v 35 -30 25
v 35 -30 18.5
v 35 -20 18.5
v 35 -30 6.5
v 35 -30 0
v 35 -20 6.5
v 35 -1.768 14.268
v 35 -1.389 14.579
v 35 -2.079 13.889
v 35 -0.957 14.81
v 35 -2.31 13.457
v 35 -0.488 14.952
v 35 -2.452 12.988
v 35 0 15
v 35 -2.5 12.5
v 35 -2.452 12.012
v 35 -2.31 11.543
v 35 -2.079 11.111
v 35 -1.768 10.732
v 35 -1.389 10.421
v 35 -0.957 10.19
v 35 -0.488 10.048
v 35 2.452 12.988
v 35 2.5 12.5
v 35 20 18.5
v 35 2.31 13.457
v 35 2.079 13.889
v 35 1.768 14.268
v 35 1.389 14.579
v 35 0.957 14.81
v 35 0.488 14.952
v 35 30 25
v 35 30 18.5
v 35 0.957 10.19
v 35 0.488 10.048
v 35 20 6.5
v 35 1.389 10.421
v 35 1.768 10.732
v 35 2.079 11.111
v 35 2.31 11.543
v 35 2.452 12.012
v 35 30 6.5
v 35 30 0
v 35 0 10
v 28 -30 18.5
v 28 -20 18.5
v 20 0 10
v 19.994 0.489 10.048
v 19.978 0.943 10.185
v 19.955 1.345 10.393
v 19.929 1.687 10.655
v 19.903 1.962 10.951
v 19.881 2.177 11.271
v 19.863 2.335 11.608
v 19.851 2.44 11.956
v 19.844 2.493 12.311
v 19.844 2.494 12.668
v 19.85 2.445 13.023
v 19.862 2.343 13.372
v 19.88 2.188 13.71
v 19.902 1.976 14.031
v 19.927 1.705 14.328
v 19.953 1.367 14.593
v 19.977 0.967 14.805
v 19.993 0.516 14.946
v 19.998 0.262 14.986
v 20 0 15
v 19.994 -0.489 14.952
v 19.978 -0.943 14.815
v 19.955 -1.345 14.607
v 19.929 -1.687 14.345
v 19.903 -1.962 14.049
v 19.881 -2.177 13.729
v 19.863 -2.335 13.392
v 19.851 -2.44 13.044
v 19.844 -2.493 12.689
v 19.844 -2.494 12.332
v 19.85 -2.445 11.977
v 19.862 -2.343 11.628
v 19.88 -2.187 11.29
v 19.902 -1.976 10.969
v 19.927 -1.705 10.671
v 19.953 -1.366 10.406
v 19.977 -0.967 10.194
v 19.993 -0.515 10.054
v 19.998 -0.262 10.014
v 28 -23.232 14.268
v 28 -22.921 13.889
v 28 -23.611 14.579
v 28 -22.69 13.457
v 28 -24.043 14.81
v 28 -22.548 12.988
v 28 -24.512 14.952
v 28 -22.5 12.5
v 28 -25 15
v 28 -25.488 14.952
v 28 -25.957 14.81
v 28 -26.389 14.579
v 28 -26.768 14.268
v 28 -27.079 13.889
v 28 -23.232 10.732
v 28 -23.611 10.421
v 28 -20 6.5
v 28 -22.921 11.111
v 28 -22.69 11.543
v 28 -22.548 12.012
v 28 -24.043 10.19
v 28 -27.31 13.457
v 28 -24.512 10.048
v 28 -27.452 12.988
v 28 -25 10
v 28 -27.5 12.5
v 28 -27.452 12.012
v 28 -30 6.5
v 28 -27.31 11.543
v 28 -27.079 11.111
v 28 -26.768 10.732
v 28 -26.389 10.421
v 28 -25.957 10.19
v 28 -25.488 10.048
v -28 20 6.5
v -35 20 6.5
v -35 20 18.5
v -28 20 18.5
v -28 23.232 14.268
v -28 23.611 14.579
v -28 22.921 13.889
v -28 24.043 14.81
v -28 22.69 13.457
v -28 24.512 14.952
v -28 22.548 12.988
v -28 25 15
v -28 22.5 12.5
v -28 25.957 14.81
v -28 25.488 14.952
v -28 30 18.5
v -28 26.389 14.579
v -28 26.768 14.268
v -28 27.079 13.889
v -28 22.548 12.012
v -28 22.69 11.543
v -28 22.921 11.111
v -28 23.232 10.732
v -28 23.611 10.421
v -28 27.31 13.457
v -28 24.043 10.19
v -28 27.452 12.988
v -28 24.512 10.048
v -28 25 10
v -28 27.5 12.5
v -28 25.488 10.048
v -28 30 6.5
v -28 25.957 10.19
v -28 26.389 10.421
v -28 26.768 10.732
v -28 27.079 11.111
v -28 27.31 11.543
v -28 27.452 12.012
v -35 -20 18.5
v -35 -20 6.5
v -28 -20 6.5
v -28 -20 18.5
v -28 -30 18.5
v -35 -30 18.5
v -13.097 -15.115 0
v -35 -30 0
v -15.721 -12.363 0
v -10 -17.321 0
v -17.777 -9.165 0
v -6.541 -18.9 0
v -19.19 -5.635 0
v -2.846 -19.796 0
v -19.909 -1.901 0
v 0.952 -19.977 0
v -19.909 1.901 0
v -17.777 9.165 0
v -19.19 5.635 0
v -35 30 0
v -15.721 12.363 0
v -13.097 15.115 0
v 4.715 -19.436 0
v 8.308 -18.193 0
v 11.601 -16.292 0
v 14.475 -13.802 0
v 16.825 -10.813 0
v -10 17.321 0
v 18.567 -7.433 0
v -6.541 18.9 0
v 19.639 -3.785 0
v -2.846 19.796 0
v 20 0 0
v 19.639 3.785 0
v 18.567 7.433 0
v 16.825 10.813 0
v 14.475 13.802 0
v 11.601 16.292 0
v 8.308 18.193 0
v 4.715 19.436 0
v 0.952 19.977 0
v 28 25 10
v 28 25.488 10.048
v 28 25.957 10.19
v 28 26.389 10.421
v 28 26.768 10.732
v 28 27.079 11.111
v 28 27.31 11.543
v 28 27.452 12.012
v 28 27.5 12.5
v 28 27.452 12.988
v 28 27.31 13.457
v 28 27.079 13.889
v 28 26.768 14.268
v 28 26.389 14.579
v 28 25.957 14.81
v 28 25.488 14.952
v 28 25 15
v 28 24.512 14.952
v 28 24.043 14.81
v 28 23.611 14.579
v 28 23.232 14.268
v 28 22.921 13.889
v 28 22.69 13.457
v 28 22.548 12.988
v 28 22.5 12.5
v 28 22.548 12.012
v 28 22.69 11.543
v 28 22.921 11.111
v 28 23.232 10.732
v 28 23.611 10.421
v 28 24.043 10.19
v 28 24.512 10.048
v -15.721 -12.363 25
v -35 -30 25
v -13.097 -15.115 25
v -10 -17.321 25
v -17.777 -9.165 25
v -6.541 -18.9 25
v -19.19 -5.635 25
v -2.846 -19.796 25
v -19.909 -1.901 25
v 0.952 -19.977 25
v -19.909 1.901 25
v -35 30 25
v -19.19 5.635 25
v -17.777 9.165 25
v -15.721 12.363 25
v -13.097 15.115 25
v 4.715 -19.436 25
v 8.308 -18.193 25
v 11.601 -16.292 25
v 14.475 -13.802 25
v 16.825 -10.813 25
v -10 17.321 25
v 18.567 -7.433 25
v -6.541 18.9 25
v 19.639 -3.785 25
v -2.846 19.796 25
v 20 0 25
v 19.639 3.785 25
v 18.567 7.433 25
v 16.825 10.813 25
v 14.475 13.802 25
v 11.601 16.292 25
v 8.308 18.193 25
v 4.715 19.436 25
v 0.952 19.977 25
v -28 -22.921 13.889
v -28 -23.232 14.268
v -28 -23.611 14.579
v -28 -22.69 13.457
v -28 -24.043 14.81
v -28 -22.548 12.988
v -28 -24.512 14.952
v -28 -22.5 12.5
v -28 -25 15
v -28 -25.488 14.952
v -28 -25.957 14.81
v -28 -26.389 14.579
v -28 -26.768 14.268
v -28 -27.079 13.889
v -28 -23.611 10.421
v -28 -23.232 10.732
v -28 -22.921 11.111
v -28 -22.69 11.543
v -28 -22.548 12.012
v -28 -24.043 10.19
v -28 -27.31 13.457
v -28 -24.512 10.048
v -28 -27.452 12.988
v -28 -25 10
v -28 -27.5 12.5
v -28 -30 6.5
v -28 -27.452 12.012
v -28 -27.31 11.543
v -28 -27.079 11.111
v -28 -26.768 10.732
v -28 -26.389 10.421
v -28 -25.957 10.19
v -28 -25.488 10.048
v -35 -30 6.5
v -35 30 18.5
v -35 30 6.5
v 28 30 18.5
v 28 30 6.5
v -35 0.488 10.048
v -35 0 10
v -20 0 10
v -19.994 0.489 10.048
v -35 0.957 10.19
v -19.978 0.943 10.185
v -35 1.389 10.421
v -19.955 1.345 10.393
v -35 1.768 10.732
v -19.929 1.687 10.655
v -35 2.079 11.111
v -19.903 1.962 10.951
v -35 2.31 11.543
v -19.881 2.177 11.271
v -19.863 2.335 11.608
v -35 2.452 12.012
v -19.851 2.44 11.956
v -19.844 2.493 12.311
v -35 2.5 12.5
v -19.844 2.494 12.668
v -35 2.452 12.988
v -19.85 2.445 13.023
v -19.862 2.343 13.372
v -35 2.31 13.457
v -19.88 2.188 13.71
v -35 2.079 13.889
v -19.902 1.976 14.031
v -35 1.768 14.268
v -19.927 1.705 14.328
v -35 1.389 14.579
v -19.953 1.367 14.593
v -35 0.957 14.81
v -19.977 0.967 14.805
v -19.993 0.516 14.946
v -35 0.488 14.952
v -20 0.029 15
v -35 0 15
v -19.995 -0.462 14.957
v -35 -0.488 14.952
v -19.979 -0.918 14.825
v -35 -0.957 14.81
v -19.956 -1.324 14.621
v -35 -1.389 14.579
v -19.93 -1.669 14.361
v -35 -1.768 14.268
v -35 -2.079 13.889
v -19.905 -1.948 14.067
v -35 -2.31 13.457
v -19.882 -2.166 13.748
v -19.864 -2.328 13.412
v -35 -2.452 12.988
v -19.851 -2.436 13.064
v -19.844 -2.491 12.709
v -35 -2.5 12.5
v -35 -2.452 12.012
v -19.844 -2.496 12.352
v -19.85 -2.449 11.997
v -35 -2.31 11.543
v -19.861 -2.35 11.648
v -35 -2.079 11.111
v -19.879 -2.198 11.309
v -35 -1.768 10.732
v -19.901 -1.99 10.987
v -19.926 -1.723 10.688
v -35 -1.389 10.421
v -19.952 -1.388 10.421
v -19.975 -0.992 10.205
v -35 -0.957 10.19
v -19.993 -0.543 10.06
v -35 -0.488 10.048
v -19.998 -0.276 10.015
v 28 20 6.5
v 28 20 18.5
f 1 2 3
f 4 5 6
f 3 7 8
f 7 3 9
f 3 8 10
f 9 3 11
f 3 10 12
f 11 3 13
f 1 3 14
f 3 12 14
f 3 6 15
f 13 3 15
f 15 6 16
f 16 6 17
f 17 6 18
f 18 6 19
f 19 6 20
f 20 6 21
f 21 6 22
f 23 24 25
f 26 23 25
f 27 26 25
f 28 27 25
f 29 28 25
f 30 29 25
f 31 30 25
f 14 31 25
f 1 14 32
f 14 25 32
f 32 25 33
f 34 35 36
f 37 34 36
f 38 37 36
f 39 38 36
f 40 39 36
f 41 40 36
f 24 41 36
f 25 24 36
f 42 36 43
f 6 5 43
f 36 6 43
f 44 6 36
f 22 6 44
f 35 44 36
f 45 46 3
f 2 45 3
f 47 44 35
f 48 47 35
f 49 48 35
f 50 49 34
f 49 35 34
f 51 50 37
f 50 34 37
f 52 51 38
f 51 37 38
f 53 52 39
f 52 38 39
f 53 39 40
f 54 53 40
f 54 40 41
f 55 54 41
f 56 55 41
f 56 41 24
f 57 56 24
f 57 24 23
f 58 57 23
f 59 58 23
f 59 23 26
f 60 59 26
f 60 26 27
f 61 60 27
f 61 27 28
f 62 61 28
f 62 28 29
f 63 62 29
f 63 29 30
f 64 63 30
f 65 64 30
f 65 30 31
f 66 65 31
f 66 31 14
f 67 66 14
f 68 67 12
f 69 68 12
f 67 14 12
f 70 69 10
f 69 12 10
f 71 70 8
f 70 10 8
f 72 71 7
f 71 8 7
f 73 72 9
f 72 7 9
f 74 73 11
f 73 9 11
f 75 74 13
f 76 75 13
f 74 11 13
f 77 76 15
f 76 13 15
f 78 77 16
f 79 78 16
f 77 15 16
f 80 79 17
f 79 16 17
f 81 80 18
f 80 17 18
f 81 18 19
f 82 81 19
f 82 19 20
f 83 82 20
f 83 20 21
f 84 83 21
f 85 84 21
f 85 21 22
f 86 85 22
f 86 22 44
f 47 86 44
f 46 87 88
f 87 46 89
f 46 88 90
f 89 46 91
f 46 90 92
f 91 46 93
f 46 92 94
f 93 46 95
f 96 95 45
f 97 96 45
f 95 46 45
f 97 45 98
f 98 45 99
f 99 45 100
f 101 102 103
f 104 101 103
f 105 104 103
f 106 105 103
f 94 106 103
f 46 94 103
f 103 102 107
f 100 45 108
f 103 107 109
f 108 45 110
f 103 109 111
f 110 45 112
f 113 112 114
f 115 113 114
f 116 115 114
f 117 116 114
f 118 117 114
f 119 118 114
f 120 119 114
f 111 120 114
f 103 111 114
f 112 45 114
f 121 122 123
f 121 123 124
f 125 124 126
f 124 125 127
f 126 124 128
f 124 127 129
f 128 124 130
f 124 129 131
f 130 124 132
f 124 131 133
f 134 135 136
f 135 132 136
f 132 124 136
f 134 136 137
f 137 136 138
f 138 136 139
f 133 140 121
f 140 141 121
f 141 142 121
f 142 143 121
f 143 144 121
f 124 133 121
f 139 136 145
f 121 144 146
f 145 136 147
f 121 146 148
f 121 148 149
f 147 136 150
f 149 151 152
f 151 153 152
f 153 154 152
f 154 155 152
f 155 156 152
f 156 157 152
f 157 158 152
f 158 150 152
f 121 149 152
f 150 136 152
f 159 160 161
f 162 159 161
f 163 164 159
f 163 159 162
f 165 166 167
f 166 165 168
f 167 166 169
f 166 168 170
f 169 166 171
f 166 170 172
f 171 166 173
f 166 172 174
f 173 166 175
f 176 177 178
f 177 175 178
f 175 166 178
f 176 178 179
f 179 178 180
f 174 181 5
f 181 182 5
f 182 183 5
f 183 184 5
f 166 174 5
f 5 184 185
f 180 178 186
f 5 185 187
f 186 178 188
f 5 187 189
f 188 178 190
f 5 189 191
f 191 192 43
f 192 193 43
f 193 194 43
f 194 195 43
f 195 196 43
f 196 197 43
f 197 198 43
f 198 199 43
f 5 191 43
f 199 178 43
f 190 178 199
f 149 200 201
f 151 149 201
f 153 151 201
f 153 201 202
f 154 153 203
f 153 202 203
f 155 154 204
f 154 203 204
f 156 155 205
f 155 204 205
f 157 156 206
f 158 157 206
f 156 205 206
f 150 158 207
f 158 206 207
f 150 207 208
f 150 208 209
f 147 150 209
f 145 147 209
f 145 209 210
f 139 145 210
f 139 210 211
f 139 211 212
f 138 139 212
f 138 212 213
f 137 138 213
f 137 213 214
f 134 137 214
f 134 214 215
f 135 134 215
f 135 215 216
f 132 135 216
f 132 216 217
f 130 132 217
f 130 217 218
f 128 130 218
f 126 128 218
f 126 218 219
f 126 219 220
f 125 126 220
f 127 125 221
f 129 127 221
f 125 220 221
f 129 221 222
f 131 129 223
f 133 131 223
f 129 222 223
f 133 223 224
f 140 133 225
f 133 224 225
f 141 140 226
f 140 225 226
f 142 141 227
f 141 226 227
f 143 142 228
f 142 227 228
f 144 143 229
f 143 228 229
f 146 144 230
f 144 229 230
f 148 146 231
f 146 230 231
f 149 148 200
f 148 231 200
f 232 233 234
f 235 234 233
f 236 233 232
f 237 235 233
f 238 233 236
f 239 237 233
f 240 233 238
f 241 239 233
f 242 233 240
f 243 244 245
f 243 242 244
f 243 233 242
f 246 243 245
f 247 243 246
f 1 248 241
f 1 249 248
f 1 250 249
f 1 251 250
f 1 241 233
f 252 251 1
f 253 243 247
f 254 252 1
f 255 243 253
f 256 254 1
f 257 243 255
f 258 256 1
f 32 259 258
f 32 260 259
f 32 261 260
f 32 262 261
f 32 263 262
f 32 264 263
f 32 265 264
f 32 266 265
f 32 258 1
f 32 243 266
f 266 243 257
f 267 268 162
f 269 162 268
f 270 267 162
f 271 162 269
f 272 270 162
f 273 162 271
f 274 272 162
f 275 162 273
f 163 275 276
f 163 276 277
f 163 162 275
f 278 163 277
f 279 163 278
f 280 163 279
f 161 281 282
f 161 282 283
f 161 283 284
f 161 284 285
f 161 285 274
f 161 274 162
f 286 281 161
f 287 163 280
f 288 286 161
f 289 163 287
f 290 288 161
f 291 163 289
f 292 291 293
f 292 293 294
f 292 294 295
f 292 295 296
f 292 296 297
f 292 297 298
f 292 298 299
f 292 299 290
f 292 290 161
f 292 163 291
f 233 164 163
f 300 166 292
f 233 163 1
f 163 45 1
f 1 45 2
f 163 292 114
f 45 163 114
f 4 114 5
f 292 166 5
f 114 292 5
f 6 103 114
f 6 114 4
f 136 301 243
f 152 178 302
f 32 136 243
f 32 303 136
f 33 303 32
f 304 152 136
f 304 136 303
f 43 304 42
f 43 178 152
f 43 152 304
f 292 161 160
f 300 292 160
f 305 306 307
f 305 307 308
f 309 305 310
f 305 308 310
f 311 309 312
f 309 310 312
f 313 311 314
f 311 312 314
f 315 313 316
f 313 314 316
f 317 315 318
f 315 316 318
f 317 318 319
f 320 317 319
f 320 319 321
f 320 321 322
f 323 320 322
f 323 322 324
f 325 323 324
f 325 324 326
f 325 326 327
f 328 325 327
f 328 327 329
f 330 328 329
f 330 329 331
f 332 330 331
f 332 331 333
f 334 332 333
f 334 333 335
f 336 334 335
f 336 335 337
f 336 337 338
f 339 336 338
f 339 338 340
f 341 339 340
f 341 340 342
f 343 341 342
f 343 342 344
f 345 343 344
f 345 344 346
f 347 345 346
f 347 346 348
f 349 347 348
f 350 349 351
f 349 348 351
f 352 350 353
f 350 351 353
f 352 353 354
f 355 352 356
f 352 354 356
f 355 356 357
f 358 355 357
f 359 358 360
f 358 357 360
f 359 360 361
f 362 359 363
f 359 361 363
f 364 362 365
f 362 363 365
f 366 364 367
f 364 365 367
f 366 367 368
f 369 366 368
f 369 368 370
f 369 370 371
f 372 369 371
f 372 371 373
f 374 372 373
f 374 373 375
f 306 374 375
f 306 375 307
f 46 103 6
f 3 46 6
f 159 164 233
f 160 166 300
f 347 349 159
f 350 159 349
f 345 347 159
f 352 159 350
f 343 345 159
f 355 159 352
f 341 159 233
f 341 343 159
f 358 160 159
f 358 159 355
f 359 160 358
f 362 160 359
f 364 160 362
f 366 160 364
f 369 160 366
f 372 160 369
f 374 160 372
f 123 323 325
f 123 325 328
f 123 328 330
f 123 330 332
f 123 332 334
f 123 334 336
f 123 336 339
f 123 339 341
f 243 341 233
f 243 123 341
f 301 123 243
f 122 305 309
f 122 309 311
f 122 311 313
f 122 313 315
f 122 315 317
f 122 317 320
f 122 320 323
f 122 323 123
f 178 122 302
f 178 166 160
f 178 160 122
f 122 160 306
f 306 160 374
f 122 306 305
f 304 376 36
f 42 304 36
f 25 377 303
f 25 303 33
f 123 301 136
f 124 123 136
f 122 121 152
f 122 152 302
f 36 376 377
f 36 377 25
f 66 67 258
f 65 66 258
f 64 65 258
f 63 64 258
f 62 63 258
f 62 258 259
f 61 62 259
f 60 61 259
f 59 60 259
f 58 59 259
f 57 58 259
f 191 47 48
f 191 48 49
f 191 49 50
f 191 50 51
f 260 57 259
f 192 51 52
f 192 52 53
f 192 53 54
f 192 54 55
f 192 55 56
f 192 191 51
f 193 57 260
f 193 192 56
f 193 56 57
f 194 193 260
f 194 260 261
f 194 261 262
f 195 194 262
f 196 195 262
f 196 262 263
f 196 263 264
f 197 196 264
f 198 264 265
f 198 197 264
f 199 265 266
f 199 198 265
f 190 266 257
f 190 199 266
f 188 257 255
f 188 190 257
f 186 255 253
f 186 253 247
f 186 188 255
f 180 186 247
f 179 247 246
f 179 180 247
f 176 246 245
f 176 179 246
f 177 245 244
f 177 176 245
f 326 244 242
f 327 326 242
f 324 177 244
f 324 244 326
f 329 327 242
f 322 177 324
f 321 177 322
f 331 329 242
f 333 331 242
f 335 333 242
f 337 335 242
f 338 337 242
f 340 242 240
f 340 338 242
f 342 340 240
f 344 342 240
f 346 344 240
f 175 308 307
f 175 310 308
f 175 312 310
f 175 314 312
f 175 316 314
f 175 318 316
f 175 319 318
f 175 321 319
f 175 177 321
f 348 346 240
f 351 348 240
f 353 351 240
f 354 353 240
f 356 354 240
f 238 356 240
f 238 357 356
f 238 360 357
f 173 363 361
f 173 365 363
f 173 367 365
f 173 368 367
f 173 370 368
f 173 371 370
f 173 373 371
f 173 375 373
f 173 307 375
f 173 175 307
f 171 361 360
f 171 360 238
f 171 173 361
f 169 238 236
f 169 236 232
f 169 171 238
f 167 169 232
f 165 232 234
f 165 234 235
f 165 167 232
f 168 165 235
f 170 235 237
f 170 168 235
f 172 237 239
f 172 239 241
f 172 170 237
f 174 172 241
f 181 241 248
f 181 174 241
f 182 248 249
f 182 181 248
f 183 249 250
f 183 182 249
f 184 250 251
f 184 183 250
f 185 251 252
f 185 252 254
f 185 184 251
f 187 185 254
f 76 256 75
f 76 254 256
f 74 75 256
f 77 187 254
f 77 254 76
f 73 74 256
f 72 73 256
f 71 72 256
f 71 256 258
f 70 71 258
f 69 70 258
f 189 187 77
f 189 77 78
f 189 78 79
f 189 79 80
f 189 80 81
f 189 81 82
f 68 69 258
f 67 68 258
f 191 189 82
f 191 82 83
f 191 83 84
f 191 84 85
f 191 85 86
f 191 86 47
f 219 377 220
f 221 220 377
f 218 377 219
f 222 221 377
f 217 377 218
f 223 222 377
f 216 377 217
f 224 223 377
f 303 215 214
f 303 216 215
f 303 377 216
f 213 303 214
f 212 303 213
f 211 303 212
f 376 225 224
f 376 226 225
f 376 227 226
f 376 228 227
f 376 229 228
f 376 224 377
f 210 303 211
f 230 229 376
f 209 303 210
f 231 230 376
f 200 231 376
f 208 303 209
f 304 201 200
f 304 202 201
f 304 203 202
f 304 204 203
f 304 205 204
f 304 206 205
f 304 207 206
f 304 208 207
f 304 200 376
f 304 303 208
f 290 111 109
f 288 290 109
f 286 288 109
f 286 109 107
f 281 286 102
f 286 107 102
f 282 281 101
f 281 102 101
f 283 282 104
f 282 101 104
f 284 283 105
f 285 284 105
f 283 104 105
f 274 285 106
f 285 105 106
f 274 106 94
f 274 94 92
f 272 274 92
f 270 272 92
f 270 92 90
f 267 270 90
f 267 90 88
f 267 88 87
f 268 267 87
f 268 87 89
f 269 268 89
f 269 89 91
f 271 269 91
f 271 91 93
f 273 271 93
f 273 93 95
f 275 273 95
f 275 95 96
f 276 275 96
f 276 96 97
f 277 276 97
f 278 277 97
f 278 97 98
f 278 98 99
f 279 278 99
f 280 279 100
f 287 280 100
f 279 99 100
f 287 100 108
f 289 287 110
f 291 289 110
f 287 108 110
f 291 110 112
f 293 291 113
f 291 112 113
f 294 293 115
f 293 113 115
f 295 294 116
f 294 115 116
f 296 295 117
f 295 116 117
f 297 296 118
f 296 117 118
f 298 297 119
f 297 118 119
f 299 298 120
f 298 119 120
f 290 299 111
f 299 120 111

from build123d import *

# Parameters (mm, degrees)
SKETCH1_W           = 70
SKETCH1_H           = 60
SKETCH1_R           = 20
BOSS_EXTRUDE1_DEPTH = 25
SKETCH2_R           = 2.5
CUT_EXTRUDE1_DEPTH  = 81.156097709
SKETCH3_W           = 7
SKETCH3_H           = 12
CUT_EXTRUDE2_DEPTH  = 10


with BuildPart() as part:
    # Sketch1 → Boss-Extrude1 (new body)
    with BuildSketch(Plane.XY):
        Rectangle(SKETCH1_W, SKETCH1_H)
        Circle(SKETCH1_R, mode=Mode.SUBTRACT)
    extrude(amount=BOSS_EXTRUDE1_DEPTH)

    # Sketch2 → Cut-Extrude1 (cut, through all)
    with BuildSketch(Plane(origin=(35, 0, 0), x_dir=(0, 0, -1), z_dir=(1, 0, 0))):
        with Locations((-12.5, 25)):
            Circle(SKETCH2_R)
        with Locations((-12.5, -25)):
            Circle(SKETCH2_R)
        with Locations((-12.5, 0)):
            Circle(SKETCH2_R)
    extrude(amount=-CUT_EXTRUDE1_DEPTH, mode=Mode.SUBTRACT)

    # Sketch3 → Cut-Extrude2 (cut)
    with BuildSketch(Plane(origin=(0, 30, 0), x_dir=(1, 0, 0), z_dir=(0, 1, 0))):
        Polygon((-28, -6.5), (-35, -6.5), (-35, -18.5), (-28, -18.5), (-28, -15), (-28, -10), align=None)
        with Locations((31.5, -12.5)):
            Rectangle(SKETCH3_W, SKETCH3_H)
    cut_extrude2 = extrude(amount=-CUT_EXTRUDE2_DEPTH, mode=Mode.SUBTRACT)

    # Mirror1: Cut-Extrude2 across plane
    add(cut_extrude2.mirror(Plane.ZX), mode=Mode.SUBTRACT)


solid = part.part
